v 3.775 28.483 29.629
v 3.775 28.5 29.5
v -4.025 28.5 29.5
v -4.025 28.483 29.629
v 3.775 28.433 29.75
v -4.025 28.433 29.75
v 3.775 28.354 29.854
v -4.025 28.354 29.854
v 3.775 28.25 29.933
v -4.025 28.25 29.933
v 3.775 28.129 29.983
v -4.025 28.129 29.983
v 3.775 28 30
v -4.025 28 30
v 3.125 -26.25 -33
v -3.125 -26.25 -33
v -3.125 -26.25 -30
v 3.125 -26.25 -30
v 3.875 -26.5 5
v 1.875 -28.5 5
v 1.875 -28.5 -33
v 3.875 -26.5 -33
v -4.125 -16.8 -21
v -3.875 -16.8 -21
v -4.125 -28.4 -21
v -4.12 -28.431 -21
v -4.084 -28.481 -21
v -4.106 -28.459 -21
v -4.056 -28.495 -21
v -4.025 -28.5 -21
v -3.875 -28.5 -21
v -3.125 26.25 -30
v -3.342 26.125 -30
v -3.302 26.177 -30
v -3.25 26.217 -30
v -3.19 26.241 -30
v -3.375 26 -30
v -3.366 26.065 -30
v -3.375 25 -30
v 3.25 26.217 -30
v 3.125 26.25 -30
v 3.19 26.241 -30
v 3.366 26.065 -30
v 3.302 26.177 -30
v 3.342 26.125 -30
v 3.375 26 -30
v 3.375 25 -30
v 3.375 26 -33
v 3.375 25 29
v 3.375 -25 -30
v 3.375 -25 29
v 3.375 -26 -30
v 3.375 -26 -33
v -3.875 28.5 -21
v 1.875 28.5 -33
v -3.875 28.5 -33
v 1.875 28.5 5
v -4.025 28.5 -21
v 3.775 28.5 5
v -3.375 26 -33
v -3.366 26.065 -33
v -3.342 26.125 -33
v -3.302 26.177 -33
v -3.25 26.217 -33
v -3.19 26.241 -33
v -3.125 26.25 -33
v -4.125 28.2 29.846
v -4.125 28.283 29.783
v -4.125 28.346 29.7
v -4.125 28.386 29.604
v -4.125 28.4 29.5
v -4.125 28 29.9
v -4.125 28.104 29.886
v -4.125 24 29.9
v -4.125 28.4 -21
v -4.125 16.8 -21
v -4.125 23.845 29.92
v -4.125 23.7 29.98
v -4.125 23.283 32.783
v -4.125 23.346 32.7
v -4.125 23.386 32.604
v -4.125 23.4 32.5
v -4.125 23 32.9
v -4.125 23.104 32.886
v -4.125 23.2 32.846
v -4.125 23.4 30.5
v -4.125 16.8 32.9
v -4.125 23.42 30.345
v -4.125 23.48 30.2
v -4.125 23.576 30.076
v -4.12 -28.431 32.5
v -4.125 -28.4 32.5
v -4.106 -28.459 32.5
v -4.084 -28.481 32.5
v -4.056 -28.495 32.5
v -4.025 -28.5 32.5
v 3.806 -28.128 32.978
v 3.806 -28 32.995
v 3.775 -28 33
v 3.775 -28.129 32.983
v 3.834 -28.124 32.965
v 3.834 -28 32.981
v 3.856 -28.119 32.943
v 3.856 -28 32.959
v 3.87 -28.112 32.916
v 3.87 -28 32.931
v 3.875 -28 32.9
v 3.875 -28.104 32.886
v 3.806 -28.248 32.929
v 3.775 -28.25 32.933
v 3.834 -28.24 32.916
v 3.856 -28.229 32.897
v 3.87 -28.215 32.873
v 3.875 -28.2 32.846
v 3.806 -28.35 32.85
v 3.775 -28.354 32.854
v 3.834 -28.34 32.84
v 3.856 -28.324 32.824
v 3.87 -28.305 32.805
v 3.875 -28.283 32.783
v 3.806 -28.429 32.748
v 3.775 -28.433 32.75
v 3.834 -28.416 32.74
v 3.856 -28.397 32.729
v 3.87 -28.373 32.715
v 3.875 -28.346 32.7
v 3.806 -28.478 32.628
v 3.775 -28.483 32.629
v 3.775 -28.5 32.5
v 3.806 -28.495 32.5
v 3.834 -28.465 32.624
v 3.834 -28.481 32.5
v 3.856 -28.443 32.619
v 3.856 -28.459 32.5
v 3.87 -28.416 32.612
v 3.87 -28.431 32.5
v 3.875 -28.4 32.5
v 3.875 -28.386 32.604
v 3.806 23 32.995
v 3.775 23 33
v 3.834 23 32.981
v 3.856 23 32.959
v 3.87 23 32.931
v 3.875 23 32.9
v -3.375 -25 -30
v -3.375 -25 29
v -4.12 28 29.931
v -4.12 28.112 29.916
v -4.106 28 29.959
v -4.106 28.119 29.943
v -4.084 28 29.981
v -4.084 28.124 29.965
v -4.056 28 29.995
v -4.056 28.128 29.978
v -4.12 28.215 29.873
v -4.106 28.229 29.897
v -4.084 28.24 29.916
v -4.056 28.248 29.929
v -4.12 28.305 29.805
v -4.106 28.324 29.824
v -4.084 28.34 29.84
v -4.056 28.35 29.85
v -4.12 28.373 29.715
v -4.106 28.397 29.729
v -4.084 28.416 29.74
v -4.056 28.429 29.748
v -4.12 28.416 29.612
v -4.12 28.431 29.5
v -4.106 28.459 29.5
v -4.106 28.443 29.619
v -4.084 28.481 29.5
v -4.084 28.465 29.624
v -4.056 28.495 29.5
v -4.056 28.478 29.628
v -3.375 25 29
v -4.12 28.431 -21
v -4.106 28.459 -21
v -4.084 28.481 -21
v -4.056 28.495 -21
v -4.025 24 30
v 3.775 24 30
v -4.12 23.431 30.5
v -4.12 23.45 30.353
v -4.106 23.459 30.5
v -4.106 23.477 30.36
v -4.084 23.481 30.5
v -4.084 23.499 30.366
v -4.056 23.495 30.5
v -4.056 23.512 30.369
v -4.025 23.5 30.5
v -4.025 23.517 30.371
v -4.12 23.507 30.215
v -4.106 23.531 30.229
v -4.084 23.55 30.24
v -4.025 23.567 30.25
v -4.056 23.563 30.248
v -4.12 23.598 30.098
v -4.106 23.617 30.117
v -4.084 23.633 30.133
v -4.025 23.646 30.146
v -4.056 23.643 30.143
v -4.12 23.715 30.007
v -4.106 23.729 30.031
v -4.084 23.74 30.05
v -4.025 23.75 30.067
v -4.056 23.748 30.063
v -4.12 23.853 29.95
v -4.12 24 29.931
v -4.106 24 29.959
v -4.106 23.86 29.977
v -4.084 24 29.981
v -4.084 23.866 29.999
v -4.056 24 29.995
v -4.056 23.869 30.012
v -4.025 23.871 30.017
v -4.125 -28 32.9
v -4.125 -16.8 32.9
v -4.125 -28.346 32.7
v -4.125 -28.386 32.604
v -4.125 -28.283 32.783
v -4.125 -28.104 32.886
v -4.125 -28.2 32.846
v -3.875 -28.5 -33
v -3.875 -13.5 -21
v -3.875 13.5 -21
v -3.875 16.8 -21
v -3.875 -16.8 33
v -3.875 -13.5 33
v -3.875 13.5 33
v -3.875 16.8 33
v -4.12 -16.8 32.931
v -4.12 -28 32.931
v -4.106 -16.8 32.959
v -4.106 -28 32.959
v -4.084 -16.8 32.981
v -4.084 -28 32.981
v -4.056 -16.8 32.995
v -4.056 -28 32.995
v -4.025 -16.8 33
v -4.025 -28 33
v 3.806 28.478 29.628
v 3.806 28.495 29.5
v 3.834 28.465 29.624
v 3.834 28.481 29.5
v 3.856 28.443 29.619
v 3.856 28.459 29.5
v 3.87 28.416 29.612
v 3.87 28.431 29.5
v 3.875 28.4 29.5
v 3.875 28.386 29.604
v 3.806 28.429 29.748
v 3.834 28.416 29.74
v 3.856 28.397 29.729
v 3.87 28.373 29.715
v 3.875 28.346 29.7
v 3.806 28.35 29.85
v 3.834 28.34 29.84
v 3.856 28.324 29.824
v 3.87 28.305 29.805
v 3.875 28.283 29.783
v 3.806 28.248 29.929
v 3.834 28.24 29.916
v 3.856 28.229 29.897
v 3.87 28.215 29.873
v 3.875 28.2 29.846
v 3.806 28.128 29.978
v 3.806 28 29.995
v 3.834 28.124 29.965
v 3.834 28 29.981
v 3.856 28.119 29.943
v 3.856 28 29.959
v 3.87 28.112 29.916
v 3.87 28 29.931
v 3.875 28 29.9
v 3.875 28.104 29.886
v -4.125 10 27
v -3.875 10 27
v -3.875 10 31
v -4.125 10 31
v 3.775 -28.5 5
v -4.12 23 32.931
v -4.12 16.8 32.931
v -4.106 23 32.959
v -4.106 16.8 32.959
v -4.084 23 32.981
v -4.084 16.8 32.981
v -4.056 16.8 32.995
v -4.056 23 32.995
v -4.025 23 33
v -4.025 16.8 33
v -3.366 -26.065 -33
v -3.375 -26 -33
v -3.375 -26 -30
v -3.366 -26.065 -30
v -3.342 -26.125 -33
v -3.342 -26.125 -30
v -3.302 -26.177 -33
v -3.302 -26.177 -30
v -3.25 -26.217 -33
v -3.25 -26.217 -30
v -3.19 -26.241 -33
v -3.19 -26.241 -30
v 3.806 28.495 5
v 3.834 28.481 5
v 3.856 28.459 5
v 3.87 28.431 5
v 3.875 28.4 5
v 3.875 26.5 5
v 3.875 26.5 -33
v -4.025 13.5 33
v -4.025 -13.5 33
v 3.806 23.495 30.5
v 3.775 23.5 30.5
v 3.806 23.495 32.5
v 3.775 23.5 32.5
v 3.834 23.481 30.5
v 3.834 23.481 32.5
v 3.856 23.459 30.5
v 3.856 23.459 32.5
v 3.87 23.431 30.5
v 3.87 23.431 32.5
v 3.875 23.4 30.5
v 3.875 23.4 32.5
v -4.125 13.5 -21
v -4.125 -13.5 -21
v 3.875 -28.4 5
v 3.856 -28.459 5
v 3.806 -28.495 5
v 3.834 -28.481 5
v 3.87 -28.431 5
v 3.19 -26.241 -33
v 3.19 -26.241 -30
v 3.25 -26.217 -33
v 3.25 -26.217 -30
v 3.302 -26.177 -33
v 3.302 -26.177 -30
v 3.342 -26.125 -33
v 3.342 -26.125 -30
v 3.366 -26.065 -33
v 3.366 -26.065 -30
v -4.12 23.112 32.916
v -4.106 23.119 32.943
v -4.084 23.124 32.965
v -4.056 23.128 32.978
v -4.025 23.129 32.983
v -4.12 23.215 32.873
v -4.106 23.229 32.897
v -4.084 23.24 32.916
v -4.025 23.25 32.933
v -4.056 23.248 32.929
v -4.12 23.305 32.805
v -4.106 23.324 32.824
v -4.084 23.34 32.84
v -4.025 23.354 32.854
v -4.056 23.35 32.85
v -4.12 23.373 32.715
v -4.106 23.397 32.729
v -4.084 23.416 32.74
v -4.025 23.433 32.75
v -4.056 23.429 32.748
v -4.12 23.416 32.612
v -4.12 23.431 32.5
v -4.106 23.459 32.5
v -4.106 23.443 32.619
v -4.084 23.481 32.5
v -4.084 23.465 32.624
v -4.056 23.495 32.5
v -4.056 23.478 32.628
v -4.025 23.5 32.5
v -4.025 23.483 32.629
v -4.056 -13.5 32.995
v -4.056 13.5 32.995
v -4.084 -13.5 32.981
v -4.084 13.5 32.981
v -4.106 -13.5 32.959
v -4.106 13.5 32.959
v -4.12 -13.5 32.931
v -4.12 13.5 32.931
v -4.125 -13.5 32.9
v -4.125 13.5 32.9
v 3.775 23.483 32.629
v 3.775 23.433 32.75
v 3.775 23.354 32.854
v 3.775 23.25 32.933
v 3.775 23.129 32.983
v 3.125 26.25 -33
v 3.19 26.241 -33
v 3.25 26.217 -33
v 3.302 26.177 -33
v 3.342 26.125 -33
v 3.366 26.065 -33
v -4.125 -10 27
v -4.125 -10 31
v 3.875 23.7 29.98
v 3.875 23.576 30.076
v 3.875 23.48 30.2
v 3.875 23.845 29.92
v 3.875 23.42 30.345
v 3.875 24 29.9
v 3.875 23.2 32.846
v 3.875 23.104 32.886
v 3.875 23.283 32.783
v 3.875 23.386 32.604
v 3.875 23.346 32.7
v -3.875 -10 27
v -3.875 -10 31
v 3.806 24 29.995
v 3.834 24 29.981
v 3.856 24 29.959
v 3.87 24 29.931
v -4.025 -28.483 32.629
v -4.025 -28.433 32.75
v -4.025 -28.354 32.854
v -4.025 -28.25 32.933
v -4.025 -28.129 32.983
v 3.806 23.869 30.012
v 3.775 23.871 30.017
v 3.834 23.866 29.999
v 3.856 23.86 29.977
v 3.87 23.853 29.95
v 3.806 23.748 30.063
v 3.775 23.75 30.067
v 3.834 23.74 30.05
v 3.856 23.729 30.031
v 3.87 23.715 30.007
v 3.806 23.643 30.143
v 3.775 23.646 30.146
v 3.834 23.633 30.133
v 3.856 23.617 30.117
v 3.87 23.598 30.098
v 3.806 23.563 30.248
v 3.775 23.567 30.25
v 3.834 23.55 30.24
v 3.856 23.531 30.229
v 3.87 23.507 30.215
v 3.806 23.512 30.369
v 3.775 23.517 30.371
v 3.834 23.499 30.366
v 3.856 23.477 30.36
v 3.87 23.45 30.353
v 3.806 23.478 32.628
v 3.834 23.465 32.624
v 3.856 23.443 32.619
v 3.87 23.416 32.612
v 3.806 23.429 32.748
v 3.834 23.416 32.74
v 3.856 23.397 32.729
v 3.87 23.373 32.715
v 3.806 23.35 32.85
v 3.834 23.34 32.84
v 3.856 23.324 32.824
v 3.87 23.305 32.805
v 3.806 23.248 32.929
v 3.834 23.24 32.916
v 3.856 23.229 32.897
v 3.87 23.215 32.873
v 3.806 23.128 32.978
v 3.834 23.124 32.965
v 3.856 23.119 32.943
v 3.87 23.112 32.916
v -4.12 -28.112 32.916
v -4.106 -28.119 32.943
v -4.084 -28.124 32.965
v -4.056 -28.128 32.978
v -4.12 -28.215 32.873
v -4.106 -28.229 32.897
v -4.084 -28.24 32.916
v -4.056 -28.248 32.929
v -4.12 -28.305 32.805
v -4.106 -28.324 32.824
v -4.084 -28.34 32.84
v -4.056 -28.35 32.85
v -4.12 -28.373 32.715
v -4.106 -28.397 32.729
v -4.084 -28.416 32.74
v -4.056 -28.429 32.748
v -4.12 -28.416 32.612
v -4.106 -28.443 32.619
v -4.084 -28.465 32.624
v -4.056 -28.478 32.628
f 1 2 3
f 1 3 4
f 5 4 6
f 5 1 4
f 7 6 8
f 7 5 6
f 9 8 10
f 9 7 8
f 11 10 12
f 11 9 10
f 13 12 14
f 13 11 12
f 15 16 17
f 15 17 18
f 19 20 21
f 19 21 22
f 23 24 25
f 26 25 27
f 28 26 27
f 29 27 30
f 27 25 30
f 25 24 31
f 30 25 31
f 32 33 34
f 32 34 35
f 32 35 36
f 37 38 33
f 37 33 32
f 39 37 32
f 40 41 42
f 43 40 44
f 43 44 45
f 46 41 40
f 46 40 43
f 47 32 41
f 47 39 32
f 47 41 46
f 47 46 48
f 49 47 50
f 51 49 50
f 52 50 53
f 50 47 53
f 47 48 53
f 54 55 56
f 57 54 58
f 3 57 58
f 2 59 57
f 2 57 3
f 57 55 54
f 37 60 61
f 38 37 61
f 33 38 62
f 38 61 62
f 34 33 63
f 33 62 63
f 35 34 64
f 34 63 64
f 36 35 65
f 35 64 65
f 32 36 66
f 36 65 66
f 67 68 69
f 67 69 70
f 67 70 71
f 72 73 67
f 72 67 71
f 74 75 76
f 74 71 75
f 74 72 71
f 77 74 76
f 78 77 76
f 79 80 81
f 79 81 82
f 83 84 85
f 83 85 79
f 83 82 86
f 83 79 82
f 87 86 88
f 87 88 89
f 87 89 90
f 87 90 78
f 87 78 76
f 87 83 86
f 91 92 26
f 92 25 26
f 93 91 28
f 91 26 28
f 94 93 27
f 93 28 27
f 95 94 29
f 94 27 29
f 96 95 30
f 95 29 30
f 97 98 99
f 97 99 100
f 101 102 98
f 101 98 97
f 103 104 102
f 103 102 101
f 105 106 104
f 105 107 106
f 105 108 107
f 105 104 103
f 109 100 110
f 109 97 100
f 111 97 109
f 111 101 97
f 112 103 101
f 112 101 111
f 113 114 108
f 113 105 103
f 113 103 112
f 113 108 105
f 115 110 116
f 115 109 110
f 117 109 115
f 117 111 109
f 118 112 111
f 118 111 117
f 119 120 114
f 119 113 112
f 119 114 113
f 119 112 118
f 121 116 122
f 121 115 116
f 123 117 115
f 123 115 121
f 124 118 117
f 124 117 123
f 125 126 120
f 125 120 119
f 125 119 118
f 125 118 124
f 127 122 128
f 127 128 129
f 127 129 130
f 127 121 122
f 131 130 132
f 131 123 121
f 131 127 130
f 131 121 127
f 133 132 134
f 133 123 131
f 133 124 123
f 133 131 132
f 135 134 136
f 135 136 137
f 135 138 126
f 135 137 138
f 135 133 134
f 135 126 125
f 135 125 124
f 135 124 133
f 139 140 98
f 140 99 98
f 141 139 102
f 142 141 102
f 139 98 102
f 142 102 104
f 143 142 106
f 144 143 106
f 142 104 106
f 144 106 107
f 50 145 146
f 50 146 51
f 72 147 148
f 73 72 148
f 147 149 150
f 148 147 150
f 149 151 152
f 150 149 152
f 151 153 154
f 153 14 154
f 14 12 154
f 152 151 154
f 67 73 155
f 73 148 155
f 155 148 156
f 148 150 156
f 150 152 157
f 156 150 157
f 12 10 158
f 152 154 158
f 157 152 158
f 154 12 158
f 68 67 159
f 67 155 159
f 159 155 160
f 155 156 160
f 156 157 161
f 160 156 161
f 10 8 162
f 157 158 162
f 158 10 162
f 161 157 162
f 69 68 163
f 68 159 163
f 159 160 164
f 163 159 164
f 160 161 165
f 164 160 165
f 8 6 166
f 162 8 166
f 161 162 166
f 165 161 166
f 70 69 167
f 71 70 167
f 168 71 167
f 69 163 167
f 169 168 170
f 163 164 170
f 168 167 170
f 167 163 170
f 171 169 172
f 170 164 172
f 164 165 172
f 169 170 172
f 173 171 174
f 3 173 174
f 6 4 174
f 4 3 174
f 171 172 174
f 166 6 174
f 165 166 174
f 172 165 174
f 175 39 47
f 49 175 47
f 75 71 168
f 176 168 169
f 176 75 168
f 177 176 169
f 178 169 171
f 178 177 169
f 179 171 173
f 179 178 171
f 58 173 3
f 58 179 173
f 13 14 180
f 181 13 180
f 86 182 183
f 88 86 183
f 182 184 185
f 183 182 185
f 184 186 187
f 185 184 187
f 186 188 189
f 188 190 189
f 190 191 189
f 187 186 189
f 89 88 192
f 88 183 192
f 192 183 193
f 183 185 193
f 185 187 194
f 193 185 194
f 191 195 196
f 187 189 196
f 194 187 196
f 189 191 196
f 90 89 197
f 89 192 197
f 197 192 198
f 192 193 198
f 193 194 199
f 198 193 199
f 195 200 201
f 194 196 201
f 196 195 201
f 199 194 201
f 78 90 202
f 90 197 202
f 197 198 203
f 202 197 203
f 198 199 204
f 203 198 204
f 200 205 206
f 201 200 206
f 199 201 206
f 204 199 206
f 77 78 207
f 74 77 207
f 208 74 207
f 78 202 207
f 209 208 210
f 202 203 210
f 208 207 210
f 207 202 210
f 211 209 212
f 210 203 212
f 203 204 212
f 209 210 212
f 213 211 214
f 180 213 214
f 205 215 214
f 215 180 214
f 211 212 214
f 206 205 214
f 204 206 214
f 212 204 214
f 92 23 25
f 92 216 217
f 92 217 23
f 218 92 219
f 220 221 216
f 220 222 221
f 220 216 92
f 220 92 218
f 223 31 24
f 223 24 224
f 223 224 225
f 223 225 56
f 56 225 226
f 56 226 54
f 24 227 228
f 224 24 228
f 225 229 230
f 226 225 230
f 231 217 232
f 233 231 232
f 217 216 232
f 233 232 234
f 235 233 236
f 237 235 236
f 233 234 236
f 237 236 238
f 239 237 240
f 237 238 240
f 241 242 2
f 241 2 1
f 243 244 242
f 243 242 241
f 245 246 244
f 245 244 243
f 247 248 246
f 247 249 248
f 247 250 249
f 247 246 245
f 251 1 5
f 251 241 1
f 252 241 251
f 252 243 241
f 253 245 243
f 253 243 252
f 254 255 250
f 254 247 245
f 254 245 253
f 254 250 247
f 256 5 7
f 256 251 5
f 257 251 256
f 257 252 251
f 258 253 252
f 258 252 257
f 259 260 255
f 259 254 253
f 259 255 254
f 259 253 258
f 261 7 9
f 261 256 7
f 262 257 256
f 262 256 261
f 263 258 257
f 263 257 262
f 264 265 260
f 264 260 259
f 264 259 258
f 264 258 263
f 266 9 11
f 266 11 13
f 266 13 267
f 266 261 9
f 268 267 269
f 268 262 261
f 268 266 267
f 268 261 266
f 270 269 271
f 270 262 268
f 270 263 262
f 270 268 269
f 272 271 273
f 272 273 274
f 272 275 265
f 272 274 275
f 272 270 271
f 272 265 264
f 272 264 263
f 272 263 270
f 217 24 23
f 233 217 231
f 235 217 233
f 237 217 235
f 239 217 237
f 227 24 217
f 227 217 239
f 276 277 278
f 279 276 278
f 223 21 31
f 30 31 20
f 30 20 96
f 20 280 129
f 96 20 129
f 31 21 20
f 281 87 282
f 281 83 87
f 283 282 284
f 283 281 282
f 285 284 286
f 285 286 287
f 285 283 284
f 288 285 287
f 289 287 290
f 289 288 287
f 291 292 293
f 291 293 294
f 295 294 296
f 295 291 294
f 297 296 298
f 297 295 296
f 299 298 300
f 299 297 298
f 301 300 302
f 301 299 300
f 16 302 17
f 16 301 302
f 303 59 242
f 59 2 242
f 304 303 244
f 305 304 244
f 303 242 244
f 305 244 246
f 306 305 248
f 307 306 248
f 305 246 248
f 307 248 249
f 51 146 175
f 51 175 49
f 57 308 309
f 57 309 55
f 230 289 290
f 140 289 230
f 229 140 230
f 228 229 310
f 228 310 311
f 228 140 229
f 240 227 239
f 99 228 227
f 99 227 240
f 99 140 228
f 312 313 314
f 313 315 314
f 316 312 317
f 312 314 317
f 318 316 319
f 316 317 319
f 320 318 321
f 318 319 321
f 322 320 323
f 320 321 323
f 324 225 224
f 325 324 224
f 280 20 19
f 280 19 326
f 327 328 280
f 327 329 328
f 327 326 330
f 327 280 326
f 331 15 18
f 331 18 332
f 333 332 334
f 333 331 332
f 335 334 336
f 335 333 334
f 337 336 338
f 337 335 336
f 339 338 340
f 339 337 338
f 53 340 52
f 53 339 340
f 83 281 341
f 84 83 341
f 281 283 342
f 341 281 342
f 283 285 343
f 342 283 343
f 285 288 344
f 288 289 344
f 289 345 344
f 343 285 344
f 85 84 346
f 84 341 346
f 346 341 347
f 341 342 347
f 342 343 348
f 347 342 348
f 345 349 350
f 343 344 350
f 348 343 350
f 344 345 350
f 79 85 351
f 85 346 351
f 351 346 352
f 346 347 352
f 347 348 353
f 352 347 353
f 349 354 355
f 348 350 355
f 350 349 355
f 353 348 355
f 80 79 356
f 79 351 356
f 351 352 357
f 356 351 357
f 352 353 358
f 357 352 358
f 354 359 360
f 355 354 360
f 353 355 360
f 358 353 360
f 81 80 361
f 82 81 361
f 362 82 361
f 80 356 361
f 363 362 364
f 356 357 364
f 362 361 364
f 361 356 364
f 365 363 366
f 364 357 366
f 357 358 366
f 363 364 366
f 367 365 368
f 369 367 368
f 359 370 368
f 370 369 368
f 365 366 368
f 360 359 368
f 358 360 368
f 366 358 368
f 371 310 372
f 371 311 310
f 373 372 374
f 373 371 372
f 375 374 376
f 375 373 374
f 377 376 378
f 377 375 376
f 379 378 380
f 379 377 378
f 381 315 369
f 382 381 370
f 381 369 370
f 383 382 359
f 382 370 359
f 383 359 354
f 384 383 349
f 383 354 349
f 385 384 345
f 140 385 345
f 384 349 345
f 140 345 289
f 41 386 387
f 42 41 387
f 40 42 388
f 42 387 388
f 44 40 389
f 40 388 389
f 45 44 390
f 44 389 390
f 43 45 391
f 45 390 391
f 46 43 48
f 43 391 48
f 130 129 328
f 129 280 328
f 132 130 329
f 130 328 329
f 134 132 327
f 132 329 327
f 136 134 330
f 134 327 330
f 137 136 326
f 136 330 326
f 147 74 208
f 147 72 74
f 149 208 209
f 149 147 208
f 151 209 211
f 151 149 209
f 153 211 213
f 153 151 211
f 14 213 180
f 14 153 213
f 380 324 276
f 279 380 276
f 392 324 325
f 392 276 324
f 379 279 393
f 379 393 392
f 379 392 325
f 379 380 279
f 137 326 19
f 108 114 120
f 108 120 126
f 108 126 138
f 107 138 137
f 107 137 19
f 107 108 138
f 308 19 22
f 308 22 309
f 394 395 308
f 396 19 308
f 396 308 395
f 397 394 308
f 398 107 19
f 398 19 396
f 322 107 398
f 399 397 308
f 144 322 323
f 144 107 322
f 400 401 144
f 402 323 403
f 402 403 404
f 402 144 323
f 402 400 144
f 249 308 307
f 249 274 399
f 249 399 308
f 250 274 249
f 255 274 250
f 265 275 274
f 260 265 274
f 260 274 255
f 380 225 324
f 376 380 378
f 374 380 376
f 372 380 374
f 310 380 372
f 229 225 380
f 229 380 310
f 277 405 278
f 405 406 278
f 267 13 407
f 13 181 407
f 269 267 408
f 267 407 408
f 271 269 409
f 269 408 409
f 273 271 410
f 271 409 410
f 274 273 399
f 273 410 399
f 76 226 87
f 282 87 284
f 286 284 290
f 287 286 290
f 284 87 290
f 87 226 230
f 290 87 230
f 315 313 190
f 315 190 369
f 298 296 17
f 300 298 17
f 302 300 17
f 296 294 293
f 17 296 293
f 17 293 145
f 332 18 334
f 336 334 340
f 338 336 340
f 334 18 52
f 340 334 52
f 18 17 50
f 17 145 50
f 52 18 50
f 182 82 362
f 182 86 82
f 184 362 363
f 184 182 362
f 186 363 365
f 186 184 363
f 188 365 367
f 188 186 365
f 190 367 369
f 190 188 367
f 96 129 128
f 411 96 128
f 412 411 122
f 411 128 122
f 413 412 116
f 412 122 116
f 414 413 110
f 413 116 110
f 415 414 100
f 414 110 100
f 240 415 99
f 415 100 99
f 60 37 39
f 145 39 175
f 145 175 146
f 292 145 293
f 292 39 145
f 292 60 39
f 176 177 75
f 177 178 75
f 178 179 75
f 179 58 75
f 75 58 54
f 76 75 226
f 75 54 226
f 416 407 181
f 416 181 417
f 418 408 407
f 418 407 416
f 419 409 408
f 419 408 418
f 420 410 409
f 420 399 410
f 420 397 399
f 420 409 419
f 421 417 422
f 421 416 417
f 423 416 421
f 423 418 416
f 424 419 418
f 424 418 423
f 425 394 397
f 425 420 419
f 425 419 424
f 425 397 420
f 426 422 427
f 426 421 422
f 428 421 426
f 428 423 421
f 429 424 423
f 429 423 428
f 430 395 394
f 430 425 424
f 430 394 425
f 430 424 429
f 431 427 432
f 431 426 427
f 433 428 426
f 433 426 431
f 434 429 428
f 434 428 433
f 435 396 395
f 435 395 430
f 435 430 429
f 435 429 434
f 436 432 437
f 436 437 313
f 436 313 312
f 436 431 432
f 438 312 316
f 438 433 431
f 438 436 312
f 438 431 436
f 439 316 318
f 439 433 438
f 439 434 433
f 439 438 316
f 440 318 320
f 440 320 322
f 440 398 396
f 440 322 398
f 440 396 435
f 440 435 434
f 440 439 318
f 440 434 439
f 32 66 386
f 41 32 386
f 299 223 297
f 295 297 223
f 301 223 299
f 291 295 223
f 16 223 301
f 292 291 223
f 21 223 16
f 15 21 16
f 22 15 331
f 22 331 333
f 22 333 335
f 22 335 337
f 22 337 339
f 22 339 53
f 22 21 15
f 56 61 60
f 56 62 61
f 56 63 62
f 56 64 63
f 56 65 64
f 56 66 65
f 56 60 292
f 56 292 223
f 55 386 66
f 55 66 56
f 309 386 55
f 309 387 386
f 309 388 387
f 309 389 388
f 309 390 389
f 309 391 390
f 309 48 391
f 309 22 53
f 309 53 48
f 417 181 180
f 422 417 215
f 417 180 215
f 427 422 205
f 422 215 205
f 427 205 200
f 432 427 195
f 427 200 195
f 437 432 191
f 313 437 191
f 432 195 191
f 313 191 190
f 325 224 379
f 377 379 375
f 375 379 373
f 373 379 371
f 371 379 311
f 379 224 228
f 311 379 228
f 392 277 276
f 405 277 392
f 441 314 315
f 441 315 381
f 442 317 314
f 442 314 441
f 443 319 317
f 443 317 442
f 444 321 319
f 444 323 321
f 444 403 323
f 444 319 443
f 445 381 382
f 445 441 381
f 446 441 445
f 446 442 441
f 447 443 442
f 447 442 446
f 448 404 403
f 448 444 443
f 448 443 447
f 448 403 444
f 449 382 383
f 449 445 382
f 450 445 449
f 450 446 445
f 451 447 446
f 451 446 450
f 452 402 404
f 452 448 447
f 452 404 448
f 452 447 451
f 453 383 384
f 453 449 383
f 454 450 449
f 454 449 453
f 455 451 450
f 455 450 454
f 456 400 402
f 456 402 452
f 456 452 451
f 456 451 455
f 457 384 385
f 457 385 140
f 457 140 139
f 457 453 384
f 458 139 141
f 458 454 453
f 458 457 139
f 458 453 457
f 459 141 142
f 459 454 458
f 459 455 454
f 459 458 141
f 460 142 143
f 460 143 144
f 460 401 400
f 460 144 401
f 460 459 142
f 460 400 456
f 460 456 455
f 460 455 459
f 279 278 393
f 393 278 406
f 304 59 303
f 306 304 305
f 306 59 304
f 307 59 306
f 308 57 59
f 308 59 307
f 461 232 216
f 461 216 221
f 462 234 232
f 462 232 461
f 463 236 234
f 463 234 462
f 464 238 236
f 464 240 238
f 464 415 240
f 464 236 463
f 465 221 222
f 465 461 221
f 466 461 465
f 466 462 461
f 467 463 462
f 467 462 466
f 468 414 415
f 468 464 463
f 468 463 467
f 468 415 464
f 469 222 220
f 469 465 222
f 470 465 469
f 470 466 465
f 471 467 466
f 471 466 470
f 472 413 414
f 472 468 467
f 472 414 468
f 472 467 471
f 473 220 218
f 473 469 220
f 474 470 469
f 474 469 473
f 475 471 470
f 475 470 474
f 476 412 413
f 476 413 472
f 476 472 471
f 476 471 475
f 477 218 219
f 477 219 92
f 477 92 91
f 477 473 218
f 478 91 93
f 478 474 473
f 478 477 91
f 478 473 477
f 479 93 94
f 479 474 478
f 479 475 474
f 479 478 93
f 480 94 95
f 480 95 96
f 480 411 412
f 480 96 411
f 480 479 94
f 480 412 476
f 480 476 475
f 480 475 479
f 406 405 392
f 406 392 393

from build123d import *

# Parameters (mm, degrees)
F1_DEPTH  = 3.875
F3_DEPTH  = 38
F4_W      = 27
F4_H      = 54
F4_W_2    = 20
F4_H_2    = 4
F4_W_3    = 11.7
F5_DEPTH  = 0.25
F8_R      = 0.5
F9_R      = 0.1
F11_W     = 6.75
F11_H     = 50
F12_DEPTH = 62
F14_DEPTH = 3


# Not quite as in the source:
# - a pattern or mirror of a feature is missing from the dataset's text; its kind, count and spacing are read off the source's solid


with BuildPart() as f1:
    # F0 (on Right) → F1 (new body, symmetric)
    with BuildSketch(Plane.YZ):
        Polygon((23.5, 33), (-28.5, 33), (-28.5, -33), (28.5, -33), (28.5, 30), (23.5, 30), align=None)
    extrude(amount=F1_DEPTH, both=True)

    # F2 (on face) → F3 (cut)
    with BuildSketch(Plane(origin=(0, 0, -33), x_dir=(1, 0, 0), z_dir=(0, 0, -1))):
        Polygon((3.875, 28.5), (1.875, 28.5), (3.875, 26.5), align=None)
        Polygon((3.875, -26.5), (1.875, -28.5), (3.875, -28.5), align=None)
    extrude(amount=-F3_DEPTH, mode=Mode.SUBTRACT)

    # F4 (on face) → F5 (join)
    with BuildSketch(Plane(origin=(-3.875, 0, 0), x_dir=(0, -1, 0), z_dir=(-1, 0, 0))):
        with Locations((0, 6)):
            Rectangle(F4_W, F4_H)
        with Locations((0, 29)):
            Rectangle(F4_W_2, F4_H_2, mode=Mode.SUBTRACT)
        with Locations((22.65, 6)):
            Rectangle(F4_W_3, F4_H)
        Polygon((-28.5, 30), (-28.5, -21), (-16.8, -21), (-16.8, 33), (-23.5, 33), (-23.5, 30), align=None)
    extrude(amount=F5_DEPTH)

    # F8
    f8_edges = [f1.edges().sort_by_distance(p)[0] for p in [
        (-0.125, 23.5, 33),
        (-0.125, 23.5, 30),
        (-0.125, 28.5, 30),
        (-0.125, -28.5, 33),
    ]]
    fillet(f8_edges, radius=F8_R)

    # F9
    f9_edges = [f1.edges().sort_by_distance(p)[0] for p in [
        (3.875, -2.5, 33),
        (3.875, 26, 30),
        (-4.125, 26, 30),
        (-4.125, 23.5, 31.5),
        (3.875, 23.5, 31.5),
        (-4.125, 19.9, 33),
        (-4.125, 0, 33),
        (-4.125, -22.4, 33),
        (-4.125, -28.5, 5.75),
        (3.875, -28.5, 18.75),
        (-4.125, 28.5, 4.25),
        (-4.125, -28.353553, 32.853553),
        (3.875, -28.353553, 32.853553),
        (3.875, 23.646447, 30.146447),
        (3.875, 23.353553, 32.853553),
        (3.875, 28.353553, 29.853553),
        (3.875, 28.5, 17.25),
        (-4.125, 23.353553, 32.853553),
        (-4.125, 28.353553, 29.853553),
        (-4.125, 23.646447, 30.146447),
    ]]
    fillet(f9_edges, radius=F9_R)

    # F11 (on face) → F12 (cut)
    with BuildSketch(Plane(origin=(0, 0, -33), x_dir=(1, 0, 0), z_dir=(0, 0, -1))):
        Rectangle(F11_W, F11_H)
    extrude(amount=-F12_DEPTH, mode=Mode.SUBTRACT)

    # F13 (on face) → F14 (cut)
    with BuildSketch(Plane(origin=(0, 0, -33), x_dir=(1, 0, 0), z_dir=(0, 0, -1))):
        with BuildLine():
            Line((3.375, -25), (-3.375, -25))
            Line((-3.375, -25), (-3.375, -26))
            ThreePointArc((-3.375, -26), (-3.3017766953, -26.1767766953), (-3.125, -26.25))
            Line((-3.125, -26.25), (3.125, -26.25))
            ThreePointArc((3.125, -26.25), (3.3017766953, -26.1767766953), (3.375, -26))
            Line((3.375, -26), (3.375, -25))
        make_face()
    f14 = extrude(amount=-F14_DEPTH, mode=Mode.SUBTRACT)

    # F14_copies: F14 across plane
    add(f14.mirror(Plane(origin=(0, 0, 0), x_dir=(0, 0, -1), z_dir=(0, -1, 0))), mode=Mode.SUBTRACT)


solid = f1.part
